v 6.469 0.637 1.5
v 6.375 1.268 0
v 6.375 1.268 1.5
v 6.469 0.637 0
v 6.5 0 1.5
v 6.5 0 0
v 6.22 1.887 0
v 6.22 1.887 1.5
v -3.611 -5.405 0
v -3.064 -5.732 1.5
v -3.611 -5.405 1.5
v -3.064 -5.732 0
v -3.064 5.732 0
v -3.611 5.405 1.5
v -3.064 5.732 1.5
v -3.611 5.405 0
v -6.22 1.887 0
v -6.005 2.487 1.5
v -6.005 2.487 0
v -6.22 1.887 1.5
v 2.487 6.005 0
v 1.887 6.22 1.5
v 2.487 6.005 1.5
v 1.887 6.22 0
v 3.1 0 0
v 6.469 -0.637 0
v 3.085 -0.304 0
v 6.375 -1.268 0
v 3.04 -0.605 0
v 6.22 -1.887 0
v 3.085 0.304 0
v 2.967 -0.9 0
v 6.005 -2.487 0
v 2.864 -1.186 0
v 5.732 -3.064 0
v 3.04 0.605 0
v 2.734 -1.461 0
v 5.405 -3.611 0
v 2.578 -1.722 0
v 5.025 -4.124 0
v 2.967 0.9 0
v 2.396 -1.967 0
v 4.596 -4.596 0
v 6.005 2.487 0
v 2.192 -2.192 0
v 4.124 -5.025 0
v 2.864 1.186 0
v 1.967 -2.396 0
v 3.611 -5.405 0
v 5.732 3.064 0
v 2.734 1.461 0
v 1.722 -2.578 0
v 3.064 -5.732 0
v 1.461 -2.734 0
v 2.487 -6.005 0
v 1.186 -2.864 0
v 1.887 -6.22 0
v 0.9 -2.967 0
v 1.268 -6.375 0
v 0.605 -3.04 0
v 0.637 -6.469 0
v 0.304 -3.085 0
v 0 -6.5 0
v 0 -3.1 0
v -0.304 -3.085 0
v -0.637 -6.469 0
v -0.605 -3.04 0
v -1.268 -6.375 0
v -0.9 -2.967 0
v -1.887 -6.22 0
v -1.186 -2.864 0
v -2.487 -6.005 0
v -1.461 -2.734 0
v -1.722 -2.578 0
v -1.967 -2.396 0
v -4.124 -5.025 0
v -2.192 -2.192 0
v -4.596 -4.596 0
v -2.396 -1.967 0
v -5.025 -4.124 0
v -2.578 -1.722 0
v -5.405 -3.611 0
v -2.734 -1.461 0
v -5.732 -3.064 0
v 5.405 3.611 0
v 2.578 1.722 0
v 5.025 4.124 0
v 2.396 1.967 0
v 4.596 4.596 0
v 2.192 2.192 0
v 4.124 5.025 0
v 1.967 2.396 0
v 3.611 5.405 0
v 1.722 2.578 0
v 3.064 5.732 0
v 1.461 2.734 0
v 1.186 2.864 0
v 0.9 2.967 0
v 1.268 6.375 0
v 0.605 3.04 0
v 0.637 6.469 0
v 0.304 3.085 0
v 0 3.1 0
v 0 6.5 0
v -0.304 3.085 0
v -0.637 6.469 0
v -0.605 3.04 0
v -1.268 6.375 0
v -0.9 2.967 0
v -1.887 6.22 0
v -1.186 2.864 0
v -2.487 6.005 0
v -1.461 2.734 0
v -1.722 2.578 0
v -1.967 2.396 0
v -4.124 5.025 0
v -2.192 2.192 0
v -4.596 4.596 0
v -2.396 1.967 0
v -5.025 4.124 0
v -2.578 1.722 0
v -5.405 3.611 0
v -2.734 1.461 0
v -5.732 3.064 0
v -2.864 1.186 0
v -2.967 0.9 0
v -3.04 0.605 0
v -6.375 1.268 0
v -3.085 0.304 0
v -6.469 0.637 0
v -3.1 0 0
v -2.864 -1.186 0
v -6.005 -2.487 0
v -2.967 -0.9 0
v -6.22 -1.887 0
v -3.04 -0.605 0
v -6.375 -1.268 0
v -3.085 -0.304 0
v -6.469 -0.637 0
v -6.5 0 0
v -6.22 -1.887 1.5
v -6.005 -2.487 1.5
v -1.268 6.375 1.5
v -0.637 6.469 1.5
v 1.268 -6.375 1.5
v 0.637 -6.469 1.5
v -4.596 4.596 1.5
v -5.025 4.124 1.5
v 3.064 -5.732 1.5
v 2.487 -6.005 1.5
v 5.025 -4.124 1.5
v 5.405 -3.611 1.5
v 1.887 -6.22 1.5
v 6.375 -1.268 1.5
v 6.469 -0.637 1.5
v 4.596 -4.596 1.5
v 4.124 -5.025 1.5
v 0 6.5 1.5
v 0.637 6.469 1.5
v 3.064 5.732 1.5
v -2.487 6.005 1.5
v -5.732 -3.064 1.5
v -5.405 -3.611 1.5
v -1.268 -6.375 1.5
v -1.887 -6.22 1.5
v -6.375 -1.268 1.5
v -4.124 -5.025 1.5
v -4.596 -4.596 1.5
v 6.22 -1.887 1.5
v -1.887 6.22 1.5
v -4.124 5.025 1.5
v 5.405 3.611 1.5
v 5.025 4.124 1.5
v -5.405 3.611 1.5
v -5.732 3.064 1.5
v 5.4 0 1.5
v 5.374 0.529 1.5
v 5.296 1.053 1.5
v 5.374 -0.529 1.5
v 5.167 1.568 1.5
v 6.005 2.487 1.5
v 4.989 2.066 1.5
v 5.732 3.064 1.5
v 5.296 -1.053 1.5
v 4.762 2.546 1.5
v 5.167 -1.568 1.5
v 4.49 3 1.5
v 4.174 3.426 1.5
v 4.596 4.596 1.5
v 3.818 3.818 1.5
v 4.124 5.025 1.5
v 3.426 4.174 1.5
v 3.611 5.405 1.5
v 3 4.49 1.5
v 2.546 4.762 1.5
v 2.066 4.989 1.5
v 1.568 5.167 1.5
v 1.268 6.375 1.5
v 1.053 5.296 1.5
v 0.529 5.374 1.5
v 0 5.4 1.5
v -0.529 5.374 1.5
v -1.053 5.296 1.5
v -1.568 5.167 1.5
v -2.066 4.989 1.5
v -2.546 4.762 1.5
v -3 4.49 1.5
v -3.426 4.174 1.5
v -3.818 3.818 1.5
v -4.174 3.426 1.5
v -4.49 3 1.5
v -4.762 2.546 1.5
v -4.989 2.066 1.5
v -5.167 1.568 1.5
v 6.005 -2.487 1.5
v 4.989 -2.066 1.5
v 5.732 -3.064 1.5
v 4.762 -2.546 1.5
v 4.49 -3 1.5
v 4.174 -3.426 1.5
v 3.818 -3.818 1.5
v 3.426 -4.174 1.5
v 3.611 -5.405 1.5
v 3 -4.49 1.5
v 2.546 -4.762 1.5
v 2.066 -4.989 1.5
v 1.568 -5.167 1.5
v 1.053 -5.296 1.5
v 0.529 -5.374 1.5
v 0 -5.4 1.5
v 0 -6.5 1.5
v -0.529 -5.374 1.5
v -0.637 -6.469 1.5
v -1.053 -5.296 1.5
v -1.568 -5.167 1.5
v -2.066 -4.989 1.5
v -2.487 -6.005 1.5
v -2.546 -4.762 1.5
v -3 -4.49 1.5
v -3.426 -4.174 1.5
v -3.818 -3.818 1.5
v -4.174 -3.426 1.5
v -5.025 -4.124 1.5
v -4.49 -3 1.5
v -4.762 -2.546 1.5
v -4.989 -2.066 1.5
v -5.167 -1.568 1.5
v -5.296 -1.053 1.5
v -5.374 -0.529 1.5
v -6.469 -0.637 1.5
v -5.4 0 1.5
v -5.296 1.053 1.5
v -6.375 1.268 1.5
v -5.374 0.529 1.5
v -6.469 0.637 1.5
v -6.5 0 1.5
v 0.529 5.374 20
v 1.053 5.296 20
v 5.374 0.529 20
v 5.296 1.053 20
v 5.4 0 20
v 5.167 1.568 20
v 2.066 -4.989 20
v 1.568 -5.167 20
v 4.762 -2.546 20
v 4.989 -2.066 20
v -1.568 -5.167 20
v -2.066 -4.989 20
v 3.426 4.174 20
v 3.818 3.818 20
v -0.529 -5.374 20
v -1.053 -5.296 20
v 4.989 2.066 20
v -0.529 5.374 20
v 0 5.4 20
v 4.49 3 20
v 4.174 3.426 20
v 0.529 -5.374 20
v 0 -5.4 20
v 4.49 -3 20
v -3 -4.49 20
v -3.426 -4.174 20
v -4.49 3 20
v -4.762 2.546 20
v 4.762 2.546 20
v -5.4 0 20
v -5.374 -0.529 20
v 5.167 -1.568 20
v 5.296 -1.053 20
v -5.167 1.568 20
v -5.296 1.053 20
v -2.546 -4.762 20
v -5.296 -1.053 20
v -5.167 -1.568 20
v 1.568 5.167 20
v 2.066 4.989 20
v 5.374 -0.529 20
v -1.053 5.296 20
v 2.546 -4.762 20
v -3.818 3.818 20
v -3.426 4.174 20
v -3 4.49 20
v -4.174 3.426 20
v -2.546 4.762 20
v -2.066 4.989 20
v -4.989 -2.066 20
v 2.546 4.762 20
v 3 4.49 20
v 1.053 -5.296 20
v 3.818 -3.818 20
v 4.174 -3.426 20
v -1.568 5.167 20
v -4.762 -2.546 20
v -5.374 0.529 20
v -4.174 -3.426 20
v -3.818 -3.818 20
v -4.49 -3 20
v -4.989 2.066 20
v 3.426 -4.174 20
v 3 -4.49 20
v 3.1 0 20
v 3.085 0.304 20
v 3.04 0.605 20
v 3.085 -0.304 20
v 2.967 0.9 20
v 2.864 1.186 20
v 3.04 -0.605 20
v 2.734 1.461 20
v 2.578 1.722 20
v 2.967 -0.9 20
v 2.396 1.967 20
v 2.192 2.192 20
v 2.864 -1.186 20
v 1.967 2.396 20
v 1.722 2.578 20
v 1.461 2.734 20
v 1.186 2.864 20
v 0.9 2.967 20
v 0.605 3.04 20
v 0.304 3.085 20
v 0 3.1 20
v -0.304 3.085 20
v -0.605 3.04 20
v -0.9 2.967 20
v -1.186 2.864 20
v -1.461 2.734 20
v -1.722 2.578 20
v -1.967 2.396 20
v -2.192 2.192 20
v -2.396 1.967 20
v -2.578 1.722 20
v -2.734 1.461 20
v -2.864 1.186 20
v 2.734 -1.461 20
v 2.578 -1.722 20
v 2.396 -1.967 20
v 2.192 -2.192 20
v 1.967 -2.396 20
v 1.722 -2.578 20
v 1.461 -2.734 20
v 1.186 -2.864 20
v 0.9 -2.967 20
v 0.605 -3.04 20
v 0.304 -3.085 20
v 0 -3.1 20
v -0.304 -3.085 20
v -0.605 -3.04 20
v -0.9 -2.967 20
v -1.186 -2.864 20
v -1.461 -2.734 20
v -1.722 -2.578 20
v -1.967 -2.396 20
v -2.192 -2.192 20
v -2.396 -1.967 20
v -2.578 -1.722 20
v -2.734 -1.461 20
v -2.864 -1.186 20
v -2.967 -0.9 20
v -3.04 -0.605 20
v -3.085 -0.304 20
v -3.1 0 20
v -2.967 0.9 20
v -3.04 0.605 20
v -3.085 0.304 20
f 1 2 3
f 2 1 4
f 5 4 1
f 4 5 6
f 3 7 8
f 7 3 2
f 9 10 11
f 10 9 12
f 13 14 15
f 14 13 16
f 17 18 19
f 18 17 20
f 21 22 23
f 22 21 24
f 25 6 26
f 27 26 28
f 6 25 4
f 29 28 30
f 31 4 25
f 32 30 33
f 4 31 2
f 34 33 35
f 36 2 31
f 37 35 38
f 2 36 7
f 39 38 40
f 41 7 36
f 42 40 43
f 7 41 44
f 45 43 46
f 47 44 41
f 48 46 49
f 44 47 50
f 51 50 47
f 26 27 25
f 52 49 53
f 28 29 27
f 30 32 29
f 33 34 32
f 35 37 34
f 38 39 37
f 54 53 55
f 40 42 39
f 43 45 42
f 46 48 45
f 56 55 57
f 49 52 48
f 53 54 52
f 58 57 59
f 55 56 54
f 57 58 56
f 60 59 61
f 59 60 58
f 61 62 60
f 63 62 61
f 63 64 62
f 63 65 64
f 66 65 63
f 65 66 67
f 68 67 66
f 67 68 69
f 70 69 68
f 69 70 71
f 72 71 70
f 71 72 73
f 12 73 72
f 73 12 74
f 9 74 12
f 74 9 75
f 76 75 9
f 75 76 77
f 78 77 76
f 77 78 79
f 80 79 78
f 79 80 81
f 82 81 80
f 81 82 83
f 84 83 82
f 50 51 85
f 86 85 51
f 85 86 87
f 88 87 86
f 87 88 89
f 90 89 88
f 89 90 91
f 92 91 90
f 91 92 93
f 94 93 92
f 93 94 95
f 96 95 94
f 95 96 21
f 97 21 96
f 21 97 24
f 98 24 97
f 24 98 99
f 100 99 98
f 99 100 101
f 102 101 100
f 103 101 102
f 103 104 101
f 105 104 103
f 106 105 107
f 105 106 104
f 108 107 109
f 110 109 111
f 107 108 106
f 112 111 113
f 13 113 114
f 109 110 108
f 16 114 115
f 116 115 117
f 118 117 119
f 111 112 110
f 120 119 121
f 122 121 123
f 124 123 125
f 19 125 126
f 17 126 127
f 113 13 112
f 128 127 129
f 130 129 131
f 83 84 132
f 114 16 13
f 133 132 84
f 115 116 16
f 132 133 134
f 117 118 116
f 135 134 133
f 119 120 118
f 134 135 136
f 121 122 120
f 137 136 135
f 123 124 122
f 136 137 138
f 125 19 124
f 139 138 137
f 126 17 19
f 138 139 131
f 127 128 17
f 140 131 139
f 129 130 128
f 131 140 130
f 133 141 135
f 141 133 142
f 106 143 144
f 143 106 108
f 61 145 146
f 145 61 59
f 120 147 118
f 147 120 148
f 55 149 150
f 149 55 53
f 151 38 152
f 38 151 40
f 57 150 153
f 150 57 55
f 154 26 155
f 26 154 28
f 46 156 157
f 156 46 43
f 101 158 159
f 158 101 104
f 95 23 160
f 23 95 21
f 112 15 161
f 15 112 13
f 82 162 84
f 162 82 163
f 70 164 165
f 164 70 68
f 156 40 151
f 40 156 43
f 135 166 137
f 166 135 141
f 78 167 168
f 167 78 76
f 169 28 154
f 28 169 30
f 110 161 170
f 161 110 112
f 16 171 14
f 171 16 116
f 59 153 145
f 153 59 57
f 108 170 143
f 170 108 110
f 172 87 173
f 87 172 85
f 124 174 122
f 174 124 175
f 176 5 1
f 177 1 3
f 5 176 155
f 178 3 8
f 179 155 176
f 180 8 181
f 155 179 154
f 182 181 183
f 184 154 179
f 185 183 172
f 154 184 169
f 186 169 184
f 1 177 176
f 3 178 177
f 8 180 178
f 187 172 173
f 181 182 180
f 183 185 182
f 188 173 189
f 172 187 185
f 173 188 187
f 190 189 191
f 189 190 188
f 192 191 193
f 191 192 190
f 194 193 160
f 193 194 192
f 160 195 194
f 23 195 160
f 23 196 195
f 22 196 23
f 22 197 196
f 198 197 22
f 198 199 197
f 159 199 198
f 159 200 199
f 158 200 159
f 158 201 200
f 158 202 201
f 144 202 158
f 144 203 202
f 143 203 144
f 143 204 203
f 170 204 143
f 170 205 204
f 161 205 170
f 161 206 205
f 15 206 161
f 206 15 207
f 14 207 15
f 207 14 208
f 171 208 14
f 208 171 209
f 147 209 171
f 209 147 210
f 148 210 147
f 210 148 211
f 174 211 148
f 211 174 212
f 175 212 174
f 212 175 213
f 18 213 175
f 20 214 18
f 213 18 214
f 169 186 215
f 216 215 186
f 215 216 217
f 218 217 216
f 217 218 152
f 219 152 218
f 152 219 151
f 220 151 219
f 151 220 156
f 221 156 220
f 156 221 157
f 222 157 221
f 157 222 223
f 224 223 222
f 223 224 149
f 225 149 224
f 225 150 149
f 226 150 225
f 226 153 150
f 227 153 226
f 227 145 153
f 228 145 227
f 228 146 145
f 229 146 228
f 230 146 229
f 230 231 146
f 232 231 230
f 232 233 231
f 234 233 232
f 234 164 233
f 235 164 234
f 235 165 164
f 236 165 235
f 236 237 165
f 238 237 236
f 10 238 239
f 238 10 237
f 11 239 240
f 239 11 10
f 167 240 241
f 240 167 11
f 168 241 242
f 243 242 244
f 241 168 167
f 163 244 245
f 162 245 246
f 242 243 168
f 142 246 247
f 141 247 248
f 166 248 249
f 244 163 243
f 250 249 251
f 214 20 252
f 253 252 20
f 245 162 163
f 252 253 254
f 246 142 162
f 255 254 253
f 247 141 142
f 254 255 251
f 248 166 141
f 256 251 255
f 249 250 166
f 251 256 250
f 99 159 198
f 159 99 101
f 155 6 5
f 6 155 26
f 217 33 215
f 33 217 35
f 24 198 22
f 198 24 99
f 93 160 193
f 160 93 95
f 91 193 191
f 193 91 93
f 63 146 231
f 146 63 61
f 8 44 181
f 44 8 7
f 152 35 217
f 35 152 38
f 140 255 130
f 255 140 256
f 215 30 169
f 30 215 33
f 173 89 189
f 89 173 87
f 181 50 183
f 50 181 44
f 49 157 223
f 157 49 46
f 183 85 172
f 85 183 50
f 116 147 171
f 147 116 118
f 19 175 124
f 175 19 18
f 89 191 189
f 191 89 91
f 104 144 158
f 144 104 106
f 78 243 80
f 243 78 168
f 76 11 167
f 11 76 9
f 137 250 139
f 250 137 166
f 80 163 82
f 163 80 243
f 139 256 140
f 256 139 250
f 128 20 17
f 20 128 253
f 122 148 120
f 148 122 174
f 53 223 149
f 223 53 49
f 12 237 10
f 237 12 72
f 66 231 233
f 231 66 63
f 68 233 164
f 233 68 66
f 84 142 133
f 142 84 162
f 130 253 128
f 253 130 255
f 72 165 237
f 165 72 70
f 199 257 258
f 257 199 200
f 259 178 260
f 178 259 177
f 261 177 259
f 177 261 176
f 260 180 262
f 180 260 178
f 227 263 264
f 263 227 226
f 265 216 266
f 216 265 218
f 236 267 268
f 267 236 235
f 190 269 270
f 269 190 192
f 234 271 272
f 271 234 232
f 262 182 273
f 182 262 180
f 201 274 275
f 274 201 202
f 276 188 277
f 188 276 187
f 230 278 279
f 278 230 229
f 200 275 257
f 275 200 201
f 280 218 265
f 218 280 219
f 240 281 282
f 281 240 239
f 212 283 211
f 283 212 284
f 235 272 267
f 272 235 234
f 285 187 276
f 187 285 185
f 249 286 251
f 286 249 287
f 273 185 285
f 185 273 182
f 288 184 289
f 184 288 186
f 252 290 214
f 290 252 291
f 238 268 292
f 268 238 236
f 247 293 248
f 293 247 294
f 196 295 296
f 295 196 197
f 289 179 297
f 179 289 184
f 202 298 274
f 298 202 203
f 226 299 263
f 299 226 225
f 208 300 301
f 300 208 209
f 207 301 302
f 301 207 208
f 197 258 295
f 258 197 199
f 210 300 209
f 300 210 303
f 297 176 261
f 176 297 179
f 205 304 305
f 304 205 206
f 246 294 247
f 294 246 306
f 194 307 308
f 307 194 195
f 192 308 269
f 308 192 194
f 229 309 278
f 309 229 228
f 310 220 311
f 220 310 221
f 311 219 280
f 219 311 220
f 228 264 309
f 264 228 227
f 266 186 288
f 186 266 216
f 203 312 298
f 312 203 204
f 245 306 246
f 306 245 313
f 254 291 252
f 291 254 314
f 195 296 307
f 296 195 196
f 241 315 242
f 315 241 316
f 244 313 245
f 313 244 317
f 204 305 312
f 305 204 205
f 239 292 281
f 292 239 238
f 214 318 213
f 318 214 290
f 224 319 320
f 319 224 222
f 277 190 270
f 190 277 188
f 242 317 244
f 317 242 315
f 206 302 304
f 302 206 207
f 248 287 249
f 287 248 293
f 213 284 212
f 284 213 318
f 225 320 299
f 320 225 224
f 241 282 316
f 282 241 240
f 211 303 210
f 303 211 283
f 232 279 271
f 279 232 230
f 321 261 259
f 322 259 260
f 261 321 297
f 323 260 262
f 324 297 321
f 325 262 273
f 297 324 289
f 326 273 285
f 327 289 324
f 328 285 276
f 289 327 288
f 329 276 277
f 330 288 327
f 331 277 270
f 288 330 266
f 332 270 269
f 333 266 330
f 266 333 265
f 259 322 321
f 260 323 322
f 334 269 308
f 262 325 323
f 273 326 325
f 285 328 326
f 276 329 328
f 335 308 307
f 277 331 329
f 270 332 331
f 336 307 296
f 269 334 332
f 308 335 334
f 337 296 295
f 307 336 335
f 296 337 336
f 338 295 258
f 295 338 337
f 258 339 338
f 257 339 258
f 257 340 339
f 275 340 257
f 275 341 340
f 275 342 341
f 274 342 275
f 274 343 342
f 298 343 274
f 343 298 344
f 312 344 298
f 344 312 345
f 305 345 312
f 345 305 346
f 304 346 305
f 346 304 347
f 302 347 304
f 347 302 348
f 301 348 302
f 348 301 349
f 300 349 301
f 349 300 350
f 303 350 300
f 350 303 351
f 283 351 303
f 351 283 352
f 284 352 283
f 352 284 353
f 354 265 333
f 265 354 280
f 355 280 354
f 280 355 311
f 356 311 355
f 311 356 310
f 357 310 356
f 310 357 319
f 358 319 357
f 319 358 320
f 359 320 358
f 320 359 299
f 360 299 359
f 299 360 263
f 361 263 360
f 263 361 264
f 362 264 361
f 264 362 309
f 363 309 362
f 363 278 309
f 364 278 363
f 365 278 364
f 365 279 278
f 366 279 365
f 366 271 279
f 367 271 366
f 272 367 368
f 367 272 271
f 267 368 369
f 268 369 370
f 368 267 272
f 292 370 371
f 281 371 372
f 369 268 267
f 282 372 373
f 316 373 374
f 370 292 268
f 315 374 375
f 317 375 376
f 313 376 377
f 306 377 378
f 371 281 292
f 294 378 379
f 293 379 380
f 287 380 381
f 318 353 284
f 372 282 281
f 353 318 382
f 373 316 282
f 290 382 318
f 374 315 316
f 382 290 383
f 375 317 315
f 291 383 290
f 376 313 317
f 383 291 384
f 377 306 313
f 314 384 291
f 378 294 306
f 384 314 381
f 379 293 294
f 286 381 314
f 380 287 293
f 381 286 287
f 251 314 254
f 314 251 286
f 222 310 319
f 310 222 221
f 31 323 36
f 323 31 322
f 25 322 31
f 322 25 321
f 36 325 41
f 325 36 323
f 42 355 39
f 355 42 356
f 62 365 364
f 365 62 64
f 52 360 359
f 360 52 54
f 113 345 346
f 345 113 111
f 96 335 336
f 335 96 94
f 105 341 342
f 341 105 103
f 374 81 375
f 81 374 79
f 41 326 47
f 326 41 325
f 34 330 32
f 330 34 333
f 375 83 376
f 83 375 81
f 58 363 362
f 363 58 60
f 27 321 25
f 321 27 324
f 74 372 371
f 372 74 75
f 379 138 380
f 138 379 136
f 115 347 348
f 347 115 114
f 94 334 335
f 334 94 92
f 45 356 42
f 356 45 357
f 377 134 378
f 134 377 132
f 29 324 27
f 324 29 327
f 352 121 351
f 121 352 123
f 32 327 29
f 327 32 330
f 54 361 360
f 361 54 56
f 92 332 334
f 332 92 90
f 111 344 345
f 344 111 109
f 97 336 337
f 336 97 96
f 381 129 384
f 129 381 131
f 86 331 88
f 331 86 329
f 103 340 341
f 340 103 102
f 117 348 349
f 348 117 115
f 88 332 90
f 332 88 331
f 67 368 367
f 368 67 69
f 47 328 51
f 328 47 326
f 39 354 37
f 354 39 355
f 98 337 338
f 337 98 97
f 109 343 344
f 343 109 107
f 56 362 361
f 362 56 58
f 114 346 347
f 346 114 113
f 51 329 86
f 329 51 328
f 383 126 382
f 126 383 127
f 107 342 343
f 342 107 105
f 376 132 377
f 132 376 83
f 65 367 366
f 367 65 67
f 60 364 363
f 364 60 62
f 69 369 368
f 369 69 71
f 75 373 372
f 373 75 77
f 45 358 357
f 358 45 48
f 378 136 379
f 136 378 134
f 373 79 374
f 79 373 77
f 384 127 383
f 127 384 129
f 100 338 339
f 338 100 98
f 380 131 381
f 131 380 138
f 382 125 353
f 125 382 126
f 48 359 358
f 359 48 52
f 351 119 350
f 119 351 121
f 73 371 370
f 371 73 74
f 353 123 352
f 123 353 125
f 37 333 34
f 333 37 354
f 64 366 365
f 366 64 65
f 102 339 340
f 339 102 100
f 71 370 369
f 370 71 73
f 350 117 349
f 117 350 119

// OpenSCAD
// Dimensions in millimetres
collar_od = 13;
collar_height = 1.5;
body_od = 10.8;
total_height = 21.5;
bore_diameter = 6.2;
hole_extension = 0.1;
body_height = total_height - collar_height;

// Ensure smooth curves on all cylindrical surfaces
$fn = 64;

module adapter() {
    difference() {
        union() {
            // Collar (bottom): Z = 0 to Z = collar_height
            cylinder(h = collar_height, r = collar_od / 2, center = [0, 0, collar_height / 2]);
            
            // Body (top): Z = collar_height to Z = total_height
            cylinder(h = body_height, r = body_od / 2, center = [0, 0, total_height / 2]);
        }
        
        // Bore hole: Extends past Z=0 and Z=total_height to ensure clean cuts
        cylinder(h = total_height + hole_extension, r = bore_diameter / 2, center = [0, 0, total_height / 2]);
    }
}

adapter();
